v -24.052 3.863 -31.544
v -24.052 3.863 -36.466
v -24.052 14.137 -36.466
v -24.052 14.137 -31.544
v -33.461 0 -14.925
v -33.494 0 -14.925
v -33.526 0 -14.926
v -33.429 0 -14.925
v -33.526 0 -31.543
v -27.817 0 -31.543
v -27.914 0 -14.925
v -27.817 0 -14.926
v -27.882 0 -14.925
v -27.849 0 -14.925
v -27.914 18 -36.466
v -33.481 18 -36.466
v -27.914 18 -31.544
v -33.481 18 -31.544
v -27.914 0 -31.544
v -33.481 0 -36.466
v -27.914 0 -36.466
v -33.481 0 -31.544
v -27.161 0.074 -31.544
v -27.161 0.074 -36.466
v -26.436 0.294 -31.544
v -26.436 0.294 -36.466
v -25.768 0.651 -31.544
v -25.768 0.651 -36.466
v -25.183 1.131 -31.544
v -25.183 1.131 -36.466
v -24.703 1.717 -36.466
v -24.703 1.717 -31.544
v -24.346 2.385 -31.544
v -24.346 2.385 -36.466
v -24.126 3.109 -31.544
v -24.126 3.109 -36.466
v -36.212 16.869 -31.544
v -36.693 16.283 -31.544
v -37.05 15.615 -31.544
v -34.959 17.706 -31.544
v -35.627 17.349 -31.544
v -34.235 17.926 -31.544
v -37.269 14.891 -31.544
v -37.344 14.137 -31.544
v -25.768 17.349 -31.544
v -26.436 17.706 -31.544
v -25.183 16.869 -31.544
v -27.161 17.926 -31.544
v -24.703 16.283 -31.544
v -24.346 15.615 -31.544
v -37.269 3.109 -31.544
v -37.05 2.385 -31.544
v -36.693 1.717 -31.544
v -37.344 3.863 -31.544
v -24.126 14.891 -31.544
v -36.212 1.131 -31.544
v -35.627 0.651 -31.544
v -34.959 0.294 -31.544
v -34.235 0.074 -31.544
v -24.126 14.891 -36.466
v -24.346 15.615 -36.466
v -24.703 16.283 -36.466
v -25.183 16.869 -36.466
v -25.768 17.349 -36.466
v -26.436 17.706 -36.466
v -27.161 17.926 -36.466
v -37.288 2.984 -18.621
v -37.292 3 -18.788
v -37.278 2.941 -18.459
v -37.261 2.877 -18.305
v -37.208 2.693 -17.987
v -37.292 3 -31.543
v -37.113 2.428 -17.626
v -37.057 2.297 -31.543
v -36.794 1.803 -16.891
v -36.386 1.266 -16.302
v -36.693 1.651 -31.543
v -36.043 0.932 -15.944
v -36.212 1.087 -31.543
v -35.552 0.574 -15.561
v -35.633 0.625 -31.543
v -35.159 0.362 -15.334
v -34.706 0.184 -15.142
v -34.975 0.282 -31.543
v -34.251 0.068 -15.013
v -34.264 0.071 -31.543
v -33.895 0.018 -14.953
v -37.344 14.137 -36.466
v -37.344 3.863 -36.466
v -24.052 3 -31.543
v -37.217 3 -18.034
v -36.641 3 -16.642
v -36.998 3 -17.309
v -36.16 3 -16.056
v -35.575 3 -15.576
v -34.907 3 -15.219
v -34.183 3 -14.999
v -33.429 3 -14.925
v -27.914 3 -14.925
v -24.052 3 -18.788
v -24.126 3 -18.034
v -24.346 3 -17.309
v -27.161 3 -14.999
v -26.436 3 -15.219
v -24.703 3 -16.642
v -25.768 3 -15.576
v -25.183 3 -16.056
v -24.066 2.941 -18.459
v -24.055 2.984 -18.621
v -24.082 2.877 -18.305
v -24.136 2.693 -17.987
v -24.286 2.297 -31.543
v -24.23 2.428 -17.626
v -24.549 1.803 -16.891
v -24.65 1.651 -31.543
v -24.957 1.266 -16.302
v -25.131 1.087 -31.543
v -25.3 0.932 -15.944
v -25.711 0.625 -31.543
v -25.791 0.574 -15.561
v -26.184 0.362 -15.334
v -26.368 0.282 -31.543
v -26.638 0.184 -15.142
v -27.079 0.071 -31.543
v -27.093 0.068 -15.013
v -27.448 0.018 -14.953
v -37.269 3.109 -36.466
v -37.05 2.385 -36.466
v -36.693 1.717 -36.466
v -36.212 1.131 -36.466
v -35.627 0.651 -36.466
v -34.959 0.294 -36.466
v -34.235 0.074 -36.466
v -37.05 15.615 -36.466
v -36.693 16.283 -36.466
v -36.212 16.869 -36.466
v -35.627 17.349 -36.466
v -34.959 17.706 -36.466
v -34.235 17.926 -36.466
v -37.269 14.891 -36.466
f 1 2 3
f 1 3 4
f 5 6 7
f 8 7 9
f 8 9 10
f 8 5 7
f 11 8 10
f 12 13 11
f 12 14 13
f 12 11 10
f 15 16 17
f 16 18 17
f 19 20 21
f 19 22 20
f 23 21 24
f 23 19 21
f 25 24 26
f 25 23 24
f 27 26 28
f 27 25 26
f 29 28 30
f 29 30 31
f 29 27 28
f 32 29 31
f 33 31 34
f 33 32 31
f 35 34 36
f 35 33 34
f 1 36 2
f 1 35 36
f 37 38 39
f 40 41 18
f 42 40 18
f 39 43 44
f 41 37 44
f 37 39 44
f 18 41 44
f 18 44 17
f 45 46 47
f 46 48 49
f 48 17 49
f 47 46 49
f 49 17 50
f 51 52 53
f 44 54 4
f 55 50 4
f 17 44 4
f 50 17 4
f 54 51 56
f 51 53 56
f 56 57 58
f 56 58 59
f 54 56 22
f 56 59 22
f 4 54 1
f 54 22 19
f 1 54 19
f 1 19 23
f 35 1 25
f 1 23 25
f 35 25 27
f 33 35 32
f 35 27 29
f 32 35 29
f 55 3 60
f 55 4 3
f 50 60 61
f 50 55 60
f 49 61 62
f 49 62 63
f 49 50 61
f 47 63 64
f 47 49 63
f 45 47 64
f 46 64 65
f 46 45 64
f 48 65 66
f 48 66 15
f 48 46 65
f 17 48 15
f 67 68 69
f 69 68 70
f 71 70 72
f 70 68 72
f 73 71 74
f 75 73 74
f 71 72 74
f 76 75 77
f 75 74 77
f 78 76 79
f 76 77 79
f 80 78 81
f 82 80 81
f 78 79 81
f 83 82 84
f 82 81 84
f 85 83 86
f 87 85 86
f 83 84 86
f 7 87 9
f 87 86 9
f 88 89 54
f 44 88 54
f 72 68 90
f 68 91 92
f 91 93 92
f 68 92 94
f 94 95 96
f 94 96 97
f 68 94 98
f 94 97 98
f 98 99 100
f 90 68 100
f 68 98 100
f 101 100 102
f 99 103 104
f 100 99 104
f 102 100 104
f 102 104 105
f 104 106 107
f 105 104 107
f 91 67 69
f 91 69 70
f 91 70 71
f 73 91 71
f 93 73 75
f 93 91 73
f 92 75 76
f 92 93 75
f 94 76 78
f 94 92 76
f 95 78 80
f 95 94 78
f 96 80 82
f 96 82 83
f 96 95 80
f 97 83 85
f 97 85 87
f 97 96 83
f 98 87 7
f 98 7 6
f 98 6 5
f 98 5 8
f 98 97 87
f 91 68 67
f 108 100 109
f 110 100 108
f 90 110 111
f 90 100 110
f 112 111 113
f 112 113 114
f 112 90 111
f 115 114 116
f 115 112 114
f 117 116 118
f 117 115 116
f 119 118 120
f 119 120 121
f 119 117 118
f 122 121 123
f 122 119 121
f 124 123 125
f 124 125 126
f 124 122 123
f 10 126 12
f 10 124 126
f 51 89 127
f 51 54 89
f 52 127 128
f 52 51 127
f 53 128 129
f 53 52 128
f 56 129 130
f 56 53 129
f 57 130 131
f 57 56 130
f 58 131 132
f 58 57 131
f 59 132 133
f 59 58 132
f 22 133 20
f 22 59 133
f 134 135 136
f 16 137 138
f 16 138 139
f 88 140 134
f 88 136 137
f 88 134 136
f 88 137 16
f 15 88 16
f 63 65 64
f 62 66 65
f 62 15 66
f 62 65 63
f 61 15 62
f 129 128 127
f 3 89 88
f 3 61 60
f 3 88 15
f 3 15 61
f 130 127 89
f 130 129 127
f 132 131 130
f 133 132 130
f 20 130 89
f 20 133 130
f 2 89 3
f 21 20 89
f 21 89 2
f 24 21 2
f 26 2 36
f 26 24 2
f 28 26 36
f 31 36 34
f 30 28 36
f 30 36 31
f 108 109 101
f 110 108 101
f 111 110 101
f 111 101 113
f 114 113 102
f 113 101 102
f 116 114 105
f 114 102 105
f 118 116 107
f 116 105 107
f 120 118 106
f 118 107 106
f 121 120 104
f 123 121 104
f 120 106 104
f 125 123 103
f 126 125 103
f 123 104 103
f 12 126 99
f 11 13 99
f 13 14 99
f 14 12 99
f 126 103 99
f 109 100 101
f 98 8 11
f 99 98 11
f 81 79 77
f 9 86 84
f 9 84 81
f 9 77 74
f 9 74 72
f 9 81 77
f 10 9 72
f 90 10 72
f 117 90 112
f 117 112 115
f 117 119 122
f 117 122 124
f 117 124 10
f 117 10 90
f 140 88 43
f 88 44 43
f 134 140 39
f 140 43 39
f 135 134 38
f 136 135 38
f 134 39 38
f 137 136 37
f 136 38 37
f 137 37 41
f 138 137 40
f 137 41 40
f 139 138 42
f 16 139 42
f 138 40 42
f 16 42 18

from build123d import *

# Parameters (mm, degrees)
F0_W          = 13.2919661701
F0_H          = 4.9218144268
F1_DEPTH      = 18
F2_W          = 13.2400542498
F2_H          = 16.6179258376
F3_DEPTH      = 3
F4_F1_R       = 3.8627416998
F4_F2_R       = 3.8627416998
F4_F3_R       = 3.8627416998
F4_F4_R       = 3.8627416998
F4_2_T1_DEPTH = 22.313708499
F4_2_T3_DEPTH = 35.4437393651


# Not quite as in the source:
# - a fillet or chamfer that OpenCascade refuses, or shapes differently, is made with other operations: its cross-section is extruded or revolved along the edge and cut away or added


with BuildPart() as f1:
    # F0 (on Front) → F1 (new body)
    with BuildSketch(Plane.XZ):
        with Locations((-30.6977089494, -34.0046109632)):
            Rectangle(F0_W, F0_H)
    extrude(amount=-F1_DEPTH)

    # F4: fillet of radius 3.8627416998 on 4 edges, made by hand

    # F4_f1
    f4_f1_edges = [f1.edges().sort_by_distance(p)[0] for p in [
        (-37.3436920345, 0, -34.0046109632),
    ]]
    fillet(f4_f1_edges, radius=F4_F1_R)

    # F4_f2
    f4_f2_edges = [f1.edges().sort_by_distance(p)[0] for p in [
        (-37.3436920345, 18, -34.0046109632),
    ]]
    fillet(f4_f2_edges, radius=F4_F2_R)

    # F4_f3
    f4_f3_edges = [f1.edges().sort_by_distance(p)[0] for p in [
        (-24.0517258644, 0, -34.0046109632),
    ]]
    fillet(f4_f3_edges, radius=F4_F3_R)

    # F4_f4
    f4_f4_edges = [f1.edges().sort_by_distance(p)[0] for p in [
        (-24.0517258644, 18, -34.0046109632),
    ]]
    fillet(f4_f4_edges, radius=F4_F4_R)


with BuildPart() as f3:
    # F2 (on Front) → F3 (new body)
    with BuildSketch(Plane.XZ):
        with Locations((-30.67163378, -23.2338802889)):
            Rectangle(F2_W, F2_H)
    extrude(amount=-F3_DEPTH)

    # F4#2: fillet of radius 3.8627416998 on 4 edges, made by hand

    # F4_2_s2 → F4_2_t1 (cut)
    with BuildSketch(Plane.XZ.offset(-12.6568542495)):
        with BuildLine():
            ThreePointArc((-24.0516066551, -18.7876590699), (-25.182977505, -16.05628822), (-27.9143483549, -14.9249173701))
            Line((-27.9143483549, -14.9249173701), (-24.0516066551, -14.9249173701))
            Line((-24.0516066551, -14.9249173701), (-24.0516066551, -18.7876590699))
        make_face()
        with BuildLine():
            ThreePointArc((-37.2916609049, -18.7876590699), (-36.160290055, -16.05628822), (-33.4289192051, -14.9249173701))
            Line((-33.4289192051, -14.9249173701), (-37.2916609049, -14.9249173701))
            Line((-37.2916609049, -14.9249173701), (-37.2916609049, -18.7876590699))
        make_face()
    extrude(amount=F4_2_T1_DEPTH, mode=Mode.SUBTRACT)

    # F4_2_s4 → F4_2_t3 (cut)
    with BuildSketch(Plane.XY.offset(-40.9557499714)):
        with BuildLine():
            ThreePointArc((-24.0516066551, 3), (-25.4096730705, 0.8417053065), (-27.8167693606, 0))
            Line((-27.8167693606, 0), (-24.0516066551, 0))
            Line((-24.0516066551, 0), (-24.0516066551, 3))
        make_face()
        with BuildLine():
            ThreePointArc((-37.2916609049, 3), (-35.9335944895, 0.8417053065), (-33.5264981994, 0))
            Line((-33.5264981994, 0), (-37.2916609049, 0))
            Line((-37.2916609049, 0), (-37.2916609049, 3))
        make_face()
    extrude(amount=F4_2_T3_DEPTH, mode=Mode.SUBTRACT)


solid = Compound([f1.part, f3.part])
